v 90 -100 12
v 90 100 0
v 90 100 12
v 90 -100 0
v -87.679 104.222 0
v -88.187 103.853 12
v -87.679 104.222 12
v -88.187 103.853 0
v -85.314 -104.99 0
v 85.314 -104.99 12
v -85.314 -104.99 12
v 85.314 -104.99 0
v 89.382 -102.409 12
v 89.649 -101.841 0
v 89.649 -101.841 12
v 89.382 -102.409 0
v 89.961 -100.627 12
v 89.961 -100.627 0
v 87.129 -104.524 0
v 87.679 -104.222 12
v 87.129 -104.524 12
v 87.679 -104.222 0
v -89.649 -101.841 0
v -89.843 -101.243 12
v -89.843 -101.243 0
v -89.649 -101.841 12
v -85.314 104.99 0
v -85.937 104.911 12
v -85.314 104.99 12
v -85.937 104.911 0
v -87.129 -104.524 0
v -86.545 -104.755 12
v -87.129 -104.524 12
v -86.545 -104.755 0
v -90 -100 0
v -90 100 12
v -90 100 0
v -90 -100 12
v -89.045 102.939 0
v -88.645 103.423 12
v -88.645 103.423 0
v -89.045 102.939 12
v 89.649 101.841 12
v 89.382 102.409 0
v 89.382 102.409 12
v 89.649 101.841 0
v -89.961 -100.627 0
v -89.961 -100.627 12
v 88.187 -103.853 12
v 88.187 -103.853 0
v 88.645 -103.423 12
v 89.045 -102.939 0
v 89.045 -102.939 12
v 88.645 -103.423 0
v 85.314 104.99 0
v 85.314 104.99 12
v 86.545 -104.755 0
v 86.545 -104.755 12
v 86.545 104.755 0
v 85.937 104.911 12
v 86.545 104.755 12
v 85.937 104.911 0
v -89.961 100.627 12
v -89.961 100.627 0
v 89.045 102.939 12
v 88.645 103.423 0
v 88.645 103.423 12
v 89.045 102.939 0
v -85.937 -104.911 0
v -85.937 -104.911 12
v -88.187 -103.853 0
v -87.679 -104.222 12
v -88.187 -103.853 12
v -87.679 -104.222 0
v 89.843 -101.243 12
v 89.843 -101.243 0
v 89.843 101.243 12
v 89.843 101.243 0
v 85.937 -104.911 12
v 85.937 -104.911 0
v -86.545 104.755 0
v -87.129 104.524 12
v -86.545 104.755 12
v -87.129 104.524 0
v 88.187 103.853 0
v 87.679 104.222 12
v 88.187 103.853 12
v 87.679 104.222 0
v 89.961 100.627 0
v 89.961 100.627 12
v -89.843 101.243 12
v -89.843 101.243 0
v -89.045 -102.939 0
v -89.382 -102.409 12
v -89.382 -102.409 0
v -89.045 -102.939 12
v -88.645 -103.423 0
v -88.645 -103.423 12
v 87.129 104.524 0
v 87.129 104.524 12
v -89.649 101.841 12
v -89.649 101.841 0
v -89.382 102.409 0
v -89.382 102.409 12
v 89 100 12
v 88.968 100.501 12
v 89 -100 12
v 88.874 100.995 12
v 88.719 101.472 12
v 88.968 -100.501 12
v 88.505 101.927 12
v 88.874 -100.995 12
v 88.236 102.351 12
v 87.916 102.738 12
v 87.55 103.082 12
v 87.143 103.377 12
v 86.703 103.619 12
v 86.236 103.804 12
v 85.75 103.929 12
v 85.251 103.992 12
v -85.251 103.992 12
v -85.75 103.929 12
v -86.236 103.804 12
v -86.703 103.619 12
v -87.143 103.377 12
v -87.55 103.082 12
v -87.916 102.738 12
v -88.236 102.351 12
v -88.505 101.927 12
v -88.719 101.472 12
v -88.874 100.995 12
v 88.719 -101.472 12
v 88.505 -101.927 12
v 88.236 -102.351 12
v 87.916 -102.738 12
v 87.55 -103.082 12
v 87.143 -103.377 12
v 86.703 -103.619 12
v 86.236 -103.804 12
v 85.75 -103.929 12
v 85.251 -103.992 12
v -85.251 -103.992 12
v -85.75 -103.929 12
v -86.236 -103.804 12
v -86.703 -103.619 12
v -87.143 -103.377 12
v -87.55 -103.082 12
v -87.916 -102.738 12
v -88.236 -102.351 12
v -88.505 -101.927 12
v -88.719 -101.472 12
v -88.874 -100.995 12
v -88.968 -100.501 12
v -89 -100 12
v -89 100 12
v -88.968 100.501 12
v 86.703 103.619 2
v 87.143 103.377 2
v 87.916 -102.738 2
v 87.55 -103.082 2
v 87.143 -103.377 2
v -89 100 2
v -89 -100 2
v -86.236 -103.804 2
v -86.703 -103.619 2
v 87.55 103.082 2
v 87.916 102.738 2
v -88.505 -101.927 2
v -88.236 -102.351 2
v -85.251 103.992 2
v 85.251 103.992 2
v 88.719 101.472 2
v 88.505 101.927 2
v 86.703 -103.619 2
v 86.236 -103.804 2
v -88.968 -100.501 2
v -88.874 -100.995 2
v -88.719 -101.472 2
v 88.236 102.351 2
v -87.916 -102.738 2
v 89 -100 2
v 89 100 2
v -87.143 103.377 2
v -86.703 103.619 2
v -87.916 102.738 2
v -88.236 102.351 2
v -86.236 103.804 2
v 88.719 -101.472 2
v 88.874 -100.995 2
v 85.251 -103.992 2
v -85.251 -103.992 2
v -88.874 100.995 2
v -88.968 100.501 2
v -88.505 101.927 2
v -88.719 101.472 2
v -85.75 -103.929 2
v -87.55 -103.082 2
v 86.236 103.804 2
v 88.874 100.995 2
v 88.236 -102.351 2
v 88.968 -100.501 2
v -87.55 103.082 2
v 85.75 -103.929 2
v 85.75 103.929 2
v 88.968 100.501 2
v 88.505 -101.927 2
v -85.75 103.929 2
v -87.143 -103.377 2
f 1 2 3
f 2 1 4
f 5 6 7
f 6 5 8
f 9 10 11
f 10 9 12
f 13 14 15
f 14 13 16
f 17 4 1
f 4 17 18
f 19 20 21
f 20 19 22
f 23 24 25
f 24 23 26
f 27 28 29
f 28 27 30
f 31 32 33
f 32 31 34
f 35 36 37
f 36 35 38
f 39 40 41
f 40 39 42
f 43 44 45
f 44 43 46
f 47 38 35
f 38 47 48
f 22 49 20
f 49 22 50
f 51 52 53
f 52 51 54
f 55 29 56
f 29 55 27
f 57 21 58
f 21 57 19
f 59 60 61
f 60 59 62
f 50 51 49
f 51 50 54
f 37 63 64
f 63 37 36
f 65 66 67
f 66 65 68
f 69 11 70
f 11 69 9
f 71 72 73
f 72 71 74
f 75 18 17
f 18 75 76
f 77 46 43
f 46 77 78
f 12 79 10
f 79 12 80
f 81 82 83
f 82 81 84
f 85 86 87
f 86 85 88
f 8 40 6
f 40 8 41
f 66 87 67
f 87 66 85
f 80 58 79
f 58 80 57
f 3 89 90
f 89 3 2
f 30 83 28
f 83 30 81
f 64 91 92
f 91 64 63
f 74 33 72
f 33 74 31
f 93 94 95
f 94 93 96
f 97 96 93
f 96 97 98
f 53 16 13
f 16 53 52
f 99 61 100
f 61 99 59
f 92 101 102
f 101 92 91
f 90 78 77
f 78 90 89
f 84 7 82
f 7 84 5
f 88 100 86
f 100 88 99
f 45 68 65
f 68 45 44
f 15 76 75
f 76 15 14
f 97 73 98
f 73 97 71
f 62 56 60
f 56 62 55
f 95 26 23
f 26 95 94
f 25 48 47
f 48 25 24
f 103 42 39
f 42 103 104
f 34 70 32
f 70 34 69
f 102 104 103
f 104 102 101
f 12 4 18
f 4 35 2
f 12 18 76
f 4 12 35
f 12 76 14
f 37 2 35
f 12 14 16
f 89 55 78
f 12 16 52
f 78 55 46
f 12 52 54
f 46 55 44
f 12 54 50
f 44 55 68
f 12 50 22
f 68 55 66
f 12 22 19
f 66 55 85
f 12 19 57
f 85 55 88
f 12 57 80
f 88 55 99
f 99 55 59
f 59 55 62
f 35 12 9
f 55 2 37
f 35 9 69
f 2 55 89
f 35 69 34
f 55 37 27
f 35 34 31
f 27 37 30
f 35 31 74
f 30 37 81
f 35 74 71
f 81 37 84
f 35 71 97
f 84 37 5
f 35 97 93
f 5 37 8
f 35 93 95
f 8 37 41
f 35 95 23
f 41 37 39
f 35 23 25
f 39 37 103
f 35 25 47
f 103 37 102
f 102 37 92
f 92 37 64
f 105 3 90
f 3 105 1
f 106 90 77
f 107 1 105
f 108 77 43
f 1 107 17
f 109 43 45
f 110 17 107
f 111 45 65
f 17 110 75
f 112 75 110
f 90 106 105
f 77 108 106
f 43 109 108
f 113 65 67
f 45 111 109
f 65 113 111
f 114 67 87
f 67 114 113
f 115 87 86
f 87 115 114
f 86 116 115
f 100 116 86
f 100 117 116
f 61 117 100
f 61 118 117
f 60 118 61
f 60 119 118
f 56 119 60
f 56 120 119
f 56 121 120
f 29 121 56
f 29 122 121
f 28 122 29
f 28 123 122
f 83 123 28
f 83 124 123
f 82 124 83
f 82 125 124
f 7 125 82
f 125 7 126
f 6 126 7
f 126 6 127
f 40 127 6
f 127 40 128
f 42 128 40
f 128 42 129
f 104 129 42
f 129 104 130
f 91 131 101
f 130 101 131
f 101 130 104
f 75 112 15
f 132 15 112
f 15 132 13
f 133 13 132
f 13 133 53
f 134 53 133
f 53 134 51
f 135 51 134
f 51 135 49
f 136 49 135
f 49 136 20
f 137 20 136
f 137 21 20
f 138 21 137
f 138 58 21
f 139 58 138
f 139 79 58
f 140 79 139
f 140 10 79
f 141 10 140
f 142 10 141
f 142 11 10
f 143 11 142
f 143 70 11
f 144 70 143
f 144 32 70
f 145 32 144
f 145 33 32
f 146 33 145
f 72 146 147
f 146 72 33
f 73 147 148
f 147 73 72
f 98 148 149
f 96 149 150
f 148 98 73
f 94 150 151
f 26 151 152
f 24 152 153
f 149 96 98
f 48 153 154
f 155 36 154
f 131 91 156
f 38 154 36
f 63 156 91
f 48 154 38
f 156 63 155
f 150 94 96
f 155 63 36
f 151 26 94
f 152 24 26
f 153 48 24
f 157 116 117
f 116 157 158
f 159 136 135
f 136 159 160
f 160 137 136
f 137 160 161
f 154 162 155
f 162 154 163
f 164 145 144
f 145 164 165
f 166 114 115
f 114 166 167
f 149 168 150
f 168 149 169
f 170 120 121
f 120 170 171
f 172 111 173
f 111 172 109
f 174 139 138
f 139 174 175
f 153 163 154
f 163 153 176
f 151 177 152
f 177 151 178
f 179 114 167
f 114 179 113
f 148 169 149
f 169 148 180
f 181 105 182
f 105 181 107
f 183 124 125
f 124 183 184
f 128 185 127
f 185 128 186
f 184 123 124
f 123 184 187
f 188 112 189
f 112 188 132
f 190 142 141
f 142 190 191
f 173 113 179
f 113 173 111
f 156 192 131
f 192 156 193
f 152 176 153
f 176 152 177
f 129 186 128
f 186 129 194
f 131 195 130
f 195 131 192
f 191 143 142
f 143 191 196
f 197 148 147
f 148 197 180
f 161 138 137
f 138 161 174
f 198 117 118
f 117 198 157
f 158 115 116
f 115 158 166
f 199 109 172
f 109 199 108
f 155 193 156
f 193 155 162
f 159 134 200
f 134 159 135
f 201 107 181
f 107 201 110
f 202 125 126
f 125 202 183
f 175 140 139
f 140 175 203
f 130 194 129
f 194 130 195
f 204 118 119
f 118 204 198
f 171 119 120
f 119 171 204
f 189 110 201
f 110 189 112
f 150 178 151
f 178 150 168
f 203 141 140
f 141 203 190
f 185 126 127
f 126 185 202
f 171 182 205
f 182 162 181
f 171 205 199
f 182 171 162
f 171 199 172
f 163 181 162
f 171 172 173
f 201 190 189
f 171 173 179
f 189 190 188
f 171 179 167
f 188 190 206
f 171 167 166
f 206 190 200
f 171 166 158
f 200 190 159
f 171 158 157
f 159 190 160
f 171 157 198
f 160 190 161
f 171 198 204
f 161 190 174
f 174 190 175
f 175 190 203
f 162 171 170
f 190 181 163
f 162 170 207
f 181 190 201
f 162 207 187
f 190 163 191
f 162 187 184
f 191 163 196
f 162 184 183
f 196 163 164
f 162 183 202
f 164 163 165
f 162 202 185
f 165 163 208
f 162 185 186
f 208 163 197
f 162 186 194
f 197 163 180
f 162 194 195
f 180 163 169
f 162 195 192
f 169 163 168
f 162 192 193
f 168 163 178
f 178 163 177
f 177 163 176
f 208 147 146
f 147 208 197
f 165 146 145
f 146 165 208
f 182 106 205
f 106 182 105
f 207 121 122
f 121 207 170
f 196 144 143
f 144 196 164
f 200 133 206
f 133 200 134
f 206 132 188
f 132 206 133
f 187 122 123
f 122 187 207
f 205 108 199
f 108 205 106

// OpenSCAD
$fn = 50;


difference() {
	union() {
		hull() {
			translate(v = [-85.0000000000, 100.0000000000, 0]) {
				cylinder(h = 12, r = 5);
			}
			translate(v = [85.0000000000, 100.0000000000, 0]) {
				cylinder(h = 12, r = 5);
			}
			translate(v = [-85.0000000000, -100.0000000000, 0]) {
				cylinder(h = 12, r = 5);
			}
			translate(v = [85.0000000000, -100.0000000000, 0]) {
				cylinder(h = 12, r = 5);
			}
		}
	}
	union() {
		translate(v = [0, 0, 2]) {
			hull() {
				translate(v = [-85.0000000000, 100.0000000000, 0]) {
					cylinder(h = 10, r = 4);
				}
				translate(v = [85.0000000000, 100.0000000000, 0]) {
					cylinder(h = 10, r = 4);
				}
				translate(v = [-85.0000000000, -100.0000000000, 0]) {
					cylinder(h = 10, r = 4);
				}
				translate(v = [85.0000000000, -100.0000000000, 0]) {
					cylinder(h = 10, r = 4);
				}
			}
		}
	}
}
